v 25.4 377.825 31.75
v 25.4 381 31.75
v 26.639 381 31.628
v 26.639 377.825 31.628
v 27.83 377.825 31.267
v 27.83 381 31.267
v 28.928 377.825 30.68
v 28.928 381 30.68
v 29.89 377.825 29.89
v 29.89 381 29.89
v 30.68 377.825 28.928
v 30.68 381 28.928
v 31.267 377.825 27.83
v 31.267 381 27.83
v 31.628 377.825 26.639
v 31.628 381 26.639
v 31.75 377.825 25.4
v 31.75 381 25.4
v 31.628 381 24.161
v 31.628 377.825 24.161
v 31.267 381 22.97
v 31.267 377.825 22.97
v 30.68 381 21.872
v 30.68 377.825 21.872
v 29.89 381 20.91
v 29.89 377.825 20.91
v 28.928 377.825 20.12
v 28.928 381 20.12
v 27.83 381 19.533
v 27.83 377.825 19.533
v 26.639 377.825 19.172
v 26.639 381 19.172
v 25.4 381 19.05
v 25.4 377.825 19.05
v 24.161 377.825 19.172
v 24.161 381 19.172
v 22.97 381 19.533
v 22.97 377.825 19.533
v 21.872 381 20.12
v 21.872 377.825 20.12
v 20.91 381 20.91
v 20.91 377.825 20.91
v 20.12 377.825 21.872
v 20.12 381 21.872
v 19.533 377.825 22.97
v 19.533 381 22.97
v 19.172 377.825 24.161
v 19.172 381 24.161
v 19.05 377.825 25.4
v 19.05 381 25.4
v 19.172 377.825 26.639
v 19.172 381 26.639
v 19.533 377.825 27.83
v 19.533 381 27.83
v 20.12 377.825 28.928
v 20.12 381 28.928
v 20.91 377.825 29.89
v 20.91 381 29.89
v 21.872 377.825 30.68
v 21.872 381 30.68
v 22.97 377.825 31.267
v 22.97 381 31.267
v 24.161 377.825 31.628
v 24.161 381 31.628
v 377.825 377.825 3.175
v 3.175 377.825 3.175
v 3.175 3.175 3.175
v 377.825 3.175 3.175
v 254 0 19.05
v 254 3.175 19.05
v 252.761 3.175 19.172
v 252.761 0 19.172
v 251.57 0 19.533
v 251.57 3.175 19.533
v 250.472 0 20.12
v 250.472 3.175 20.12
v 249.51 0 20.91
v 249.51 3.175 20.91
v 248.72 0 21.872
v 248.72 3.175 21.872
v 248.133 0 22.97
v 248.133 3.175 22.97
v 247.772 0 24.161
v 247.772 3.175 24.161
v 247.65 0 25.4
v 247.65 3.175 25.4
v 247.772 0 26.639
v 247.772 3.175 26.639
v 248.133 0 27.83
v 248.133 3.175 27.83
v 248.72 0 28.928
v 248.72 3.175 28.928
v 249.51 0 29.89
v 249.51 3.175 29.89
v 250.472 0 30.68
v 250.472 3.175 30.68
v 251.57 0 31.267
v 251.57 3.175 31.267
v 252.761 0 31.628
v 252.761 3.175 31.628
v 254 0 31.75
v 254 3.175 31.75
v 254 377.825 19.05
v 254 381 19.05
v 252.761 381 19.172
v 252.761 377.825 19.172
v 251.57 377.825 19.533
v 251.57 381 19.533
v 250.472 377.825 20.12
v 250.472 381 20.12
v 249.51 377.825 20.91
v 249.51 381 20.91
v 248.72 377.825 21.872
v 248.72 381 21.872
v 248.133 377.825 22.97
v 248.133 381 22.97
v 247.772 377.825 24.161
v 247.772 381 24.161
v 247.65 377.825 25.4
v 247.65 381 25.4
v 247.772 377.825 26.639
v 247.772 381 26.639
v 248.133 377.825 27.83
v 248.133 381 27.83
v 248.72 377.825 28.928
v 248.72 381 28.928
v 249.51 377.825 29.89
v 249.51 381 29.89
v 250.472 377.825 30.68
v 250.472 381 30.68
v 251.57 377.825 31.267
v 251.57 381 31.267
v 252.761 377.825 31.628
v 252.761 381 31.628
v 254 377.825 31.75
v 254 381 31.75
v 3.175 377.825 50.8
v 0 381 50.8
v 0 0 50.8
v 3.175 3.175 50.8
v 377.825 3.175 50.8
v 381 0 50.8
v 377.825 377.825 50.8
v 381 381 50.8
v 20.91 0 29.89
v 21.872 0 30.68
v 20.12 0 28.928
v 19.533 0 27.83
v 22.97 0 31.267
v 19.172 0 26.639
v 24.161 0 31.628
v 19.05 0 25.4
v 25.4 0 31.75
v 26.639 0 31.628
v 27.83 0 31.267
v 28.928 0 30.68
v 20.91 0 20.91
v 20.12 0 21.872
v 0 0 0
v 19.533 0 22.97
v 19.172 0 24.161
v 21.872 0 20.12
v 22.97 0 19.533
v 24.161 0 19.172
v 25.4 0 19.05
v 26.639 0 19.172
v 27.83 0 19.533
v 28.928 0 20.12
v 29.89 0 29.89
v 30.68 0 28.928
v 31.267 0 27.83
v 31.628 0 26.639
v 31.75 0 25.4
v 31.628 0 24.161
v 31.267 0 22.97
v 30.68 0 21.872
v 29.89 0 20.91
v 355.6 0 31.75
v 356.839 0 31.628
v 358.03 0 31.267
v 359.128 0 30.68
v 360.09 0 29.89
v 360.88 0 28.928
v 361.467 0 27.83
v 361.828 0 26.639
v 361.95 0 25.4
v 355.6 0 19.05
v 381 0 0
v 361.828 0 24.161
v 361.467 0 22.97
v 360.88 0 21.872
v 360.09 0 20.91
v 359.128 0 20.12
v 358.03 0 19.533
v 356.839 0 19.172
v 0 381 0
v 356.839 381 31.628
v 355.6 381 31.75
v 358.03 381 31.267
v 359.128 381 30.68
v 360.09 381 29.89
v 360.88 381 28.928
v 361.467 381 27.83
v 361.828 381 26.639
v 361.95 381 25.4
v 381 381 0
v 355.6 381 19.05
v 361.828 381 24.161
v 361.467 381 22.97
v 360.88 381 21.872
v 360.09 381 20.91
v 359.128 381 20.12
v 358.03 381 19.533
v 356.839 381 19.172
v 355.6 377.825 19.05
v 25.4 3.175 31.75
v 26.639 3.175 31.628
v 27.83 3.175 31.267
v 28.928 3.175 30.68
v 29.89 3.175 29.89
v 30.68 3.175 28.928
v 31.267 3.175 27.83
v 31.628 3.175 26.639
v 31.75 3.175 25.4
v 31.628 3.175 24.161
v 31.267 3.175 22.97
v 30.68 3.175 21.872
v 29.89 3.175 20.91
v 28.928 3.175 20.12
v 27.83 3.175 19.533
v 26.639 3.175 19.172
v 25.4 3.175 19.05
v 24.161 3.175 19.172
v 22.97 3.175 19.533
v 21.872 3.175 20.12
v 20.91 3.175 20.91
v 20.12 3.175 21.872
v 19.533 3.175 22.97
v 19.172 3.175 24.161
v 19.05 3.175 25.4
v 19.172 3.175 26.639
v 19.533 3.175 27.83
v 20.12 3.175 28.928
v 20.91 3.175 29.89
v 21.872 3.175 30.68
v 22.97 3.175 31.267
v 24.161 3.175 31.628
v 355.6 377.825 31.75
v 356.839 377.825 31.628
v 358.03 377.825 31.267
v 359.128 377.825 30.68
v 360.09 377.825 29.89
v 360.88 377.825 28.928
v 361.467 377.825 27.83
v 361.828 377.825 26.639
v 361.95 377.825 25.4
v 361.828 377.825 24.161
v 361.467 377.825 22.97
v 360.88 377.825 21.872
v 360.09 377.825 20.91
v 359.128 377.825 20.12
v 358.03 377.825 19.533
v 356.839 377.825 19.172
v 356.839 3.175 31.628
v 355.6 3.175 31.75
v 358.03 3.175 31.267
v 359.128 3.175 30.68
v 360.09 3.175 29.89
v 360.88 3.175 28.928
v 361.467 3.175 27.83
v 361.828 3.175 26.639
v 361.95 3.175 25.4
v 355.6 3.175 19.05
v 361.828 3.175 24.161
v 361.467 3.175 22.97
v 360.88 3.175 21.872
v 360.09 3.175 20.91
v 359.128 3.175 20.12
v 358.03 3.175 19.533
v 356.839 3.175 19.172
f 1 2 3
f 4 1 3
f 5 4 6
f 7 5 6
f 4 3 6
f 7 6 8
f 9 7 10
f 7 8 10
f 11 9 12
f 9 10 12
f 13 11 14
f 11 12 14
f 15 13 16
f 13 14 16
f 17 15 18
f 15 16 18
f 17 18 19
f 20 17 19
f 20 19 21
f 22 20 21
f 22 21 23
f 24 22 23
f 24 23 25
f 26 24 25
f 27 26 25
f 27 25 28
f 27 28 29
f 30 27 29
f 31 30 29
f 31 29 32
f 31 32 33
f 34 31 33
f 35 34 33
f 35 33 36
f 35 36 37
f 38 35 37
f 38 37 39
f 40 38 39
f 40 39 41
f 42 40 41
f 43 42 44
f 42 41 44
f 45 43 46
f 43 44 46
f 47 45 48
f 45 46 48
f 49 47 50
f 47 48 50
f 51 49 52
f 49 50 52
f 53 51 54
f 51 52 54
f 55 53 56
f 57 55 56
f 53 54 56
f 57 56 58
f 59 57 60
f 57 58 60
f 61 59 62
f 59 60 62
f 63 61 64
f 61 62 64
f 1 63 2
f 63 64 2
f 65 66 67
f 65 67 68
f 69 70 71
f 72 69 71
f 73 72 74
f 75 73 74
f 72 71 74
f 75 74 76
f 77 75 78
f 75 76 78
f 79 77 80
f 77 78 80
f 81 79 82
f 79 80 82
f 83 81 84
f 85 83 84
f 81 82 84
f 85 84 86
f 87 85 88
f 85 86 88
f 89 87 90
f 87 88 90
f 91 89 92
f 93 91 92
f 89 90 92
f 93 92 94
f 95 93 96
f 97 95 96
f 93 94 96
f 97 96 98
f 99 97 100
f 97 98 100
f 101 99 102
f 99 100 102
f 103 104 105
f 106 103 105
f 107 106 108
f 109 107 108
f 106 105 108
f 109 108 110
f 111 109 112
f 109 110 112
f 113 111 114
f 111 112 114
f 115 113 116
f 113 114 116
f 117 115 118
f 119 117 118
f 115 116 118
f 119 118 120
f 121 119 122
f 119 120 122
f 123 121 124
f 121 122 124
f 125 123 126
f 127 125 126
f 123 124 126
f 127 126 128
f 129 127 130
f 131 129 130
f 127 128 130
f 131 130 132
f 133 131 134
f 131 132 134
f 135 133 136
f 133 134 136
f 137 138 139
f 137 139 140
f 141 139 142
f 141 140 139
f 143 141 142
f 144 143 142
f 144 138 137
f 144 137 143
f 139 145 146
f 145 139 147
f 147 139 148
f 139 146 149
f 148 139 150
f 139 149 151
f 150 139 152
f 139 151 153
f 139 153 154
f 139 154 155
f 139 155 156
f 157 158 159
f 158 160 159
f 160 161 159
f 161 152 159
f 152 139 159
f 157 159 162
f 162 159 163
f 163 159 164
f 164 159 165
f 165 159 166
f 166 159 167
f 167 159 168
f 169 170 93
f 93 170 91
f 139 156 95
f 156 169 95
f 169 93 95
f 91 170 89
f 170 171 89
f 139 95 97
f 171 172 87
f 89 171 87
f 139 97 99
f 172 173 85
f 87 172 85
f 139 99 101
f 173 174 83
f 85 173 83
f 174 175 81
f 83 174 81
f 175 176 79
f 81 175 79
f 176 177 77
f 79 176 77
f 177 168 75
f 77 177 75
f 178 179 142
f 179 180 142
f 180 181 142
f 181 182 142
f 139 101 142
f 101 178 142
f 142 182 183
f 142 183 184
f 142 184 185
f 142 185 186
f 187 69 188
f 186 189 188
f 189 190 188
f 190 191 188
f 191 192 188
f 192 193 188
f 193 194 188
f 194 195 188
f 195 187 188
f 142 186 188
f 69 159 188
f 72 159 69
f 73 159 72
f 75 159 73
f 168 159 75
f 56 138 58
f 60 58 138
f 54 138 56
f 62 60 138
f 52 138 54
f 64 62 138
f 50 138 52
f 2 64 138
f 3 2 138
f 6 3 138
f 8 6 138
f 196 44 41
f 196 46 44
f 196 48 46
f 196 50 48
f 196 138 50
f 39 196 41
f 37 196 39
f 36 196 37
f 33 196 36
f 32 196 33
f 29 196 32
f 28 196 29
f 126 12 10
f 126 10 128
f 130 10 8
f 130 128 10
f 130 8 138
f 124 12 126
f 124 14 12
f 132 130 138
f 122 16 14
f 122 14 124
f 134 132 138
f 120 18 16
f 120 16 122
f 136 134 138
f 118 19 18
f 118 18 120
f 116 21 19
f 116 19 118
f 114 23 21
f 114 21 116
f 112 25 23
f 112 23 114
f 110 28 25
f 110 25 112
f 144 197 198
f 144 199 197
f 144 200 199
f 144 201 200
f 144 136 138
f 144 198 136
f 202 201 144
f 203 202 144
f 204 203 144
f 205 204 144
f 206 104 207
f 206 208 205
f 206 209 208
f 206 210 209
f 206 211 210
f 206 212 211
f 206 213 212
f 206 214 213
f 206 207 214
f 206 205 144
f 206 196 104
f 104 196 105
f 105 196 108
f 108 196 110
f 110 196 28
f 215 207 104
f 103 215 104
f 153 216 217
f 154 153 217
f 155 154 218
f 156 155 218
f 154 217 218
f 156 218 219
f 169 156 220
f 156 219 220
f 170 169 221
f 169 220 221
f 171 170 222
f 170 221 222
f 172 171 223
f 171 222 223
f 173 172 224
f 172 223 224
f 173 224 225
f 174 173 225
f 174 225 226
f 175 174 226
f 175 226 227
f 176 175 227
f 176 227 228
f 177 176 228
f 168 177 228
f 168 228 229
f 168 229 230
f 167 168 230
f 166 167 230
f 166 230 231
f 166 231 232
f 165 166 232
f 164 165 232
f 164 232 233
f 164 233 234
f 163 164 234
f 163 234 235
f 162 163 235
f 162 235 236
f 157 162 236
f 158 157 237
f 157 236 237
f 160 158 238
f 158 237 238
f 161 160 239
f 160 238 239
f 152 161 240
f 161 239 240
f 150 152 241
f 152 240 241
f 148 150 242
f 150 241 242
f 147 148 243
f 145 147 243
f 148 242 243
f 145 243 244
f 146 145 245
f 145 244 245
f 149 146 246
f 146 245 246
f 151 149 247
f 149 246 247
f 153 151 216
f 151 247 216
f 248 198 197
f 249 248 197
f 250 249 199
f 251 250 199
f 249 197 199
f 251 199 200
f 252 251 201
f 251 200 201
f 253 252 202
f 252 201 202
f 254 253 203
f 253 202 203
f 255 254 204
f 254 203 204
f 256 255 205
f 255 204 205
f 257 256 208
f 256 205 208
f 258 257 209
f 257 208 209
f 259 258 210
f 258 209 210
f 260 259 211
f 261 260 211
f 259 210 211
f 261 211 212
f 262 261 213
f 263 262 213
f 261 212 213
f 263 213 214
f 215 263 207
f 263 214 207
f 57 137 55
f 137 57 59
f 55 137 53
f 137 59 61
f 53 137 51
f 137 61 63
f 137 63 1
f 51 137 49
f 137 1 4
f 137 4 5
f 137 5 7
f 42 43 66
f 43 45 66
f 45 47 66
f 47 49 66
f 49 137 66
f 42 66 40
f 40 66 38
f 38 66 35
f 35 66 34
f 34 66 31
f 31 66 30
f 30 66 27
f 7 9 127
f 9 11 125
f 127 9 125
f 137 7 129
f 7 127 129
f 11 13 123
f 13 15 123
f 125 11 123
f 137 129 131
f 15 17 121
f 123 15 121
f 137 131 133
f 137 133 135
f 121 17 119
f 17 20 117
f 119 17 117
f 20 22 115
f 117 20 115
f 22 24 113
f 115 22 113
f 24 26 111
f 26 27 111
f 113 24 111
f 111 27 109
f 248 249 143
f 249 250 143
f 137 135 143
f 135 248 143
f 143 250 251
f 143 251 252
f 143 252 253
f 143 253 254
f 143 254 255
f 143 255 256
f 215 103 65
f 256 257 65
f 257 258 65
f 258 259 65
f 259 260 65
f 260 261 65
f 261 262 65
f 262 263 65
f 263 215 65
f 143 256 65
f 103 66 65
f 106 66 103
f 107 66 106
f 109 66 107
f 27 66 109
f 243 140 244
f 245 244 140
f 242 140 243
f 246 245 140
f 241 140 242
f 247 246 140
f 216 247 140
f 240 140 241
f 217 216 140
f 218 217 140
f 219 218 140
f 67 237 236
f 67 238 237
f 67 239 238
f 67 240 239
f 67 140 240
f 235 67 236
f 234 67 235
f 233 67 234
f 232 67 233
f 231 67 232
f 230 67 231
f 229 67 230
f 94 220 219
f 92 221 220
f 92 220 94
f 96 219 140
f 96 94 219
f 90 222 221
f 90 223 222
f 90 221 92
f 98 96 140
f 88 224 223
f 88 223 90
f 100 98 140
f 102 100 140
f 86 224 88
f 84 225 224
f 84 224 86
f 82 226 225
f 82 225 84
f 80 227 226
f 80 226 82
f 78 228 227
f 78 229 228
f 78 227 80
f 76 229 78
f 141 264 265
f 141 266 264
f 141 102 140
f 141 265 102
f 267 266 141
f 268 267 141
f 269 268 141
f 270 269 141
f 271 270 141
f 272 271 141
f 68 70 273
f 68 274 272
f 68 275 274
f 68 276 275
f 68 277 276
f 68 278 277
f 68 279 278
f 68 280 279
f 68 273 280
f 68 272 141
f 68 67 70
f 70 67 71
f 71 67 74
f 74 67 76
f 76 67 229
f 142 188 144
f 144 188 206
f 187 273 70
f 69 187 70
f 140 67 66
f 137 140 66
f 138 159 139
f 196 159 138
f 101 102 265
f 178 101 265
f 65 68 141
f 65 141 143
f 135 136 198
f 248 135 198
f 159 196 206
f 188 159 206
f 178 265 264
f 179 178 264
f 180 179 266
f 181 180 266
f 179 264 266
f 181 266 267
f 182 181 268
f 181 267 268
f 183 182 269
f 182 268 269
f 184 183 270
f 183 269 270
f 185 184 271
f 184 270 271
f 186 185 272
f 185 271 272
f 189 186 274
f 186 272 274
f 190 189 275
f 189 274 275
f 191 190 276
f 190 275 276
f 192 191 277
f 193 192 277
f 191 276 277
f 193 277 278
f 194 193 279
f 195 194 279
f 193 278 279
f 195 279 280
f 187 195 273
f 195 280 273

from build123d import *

# Parameters (mm, degrees)
SKETCH1_W           = 381
SKETCH1_H           = 381
BOSS_EXTRUDE1_DEPTH = 50.8
SHELL1_T            = -3.175
SKETCH2_R           = 6.35
CUT_EXTRUDE1_DEPTH  = 417.576
SKETCH4_R           = 6.35
CUT_EXTRUDE2_DEPTH  = 417.576


with BuildPart() as part:
    # Sketch1 → Boss-Extrude1 (new body)
    with BuildSketch(Plane.XY):
        with Locations((190.5, 190.5)):
            Rectangle(SKETCH1_W, SKETCH1_H)
    extrude(amount=BOSS_EXTRUDE1_DEPTH)

    # Shell1
    shell1_openings = [part.faces().sort_by_distance(p)[0] for p in [
        (190.5, 190.5, 50.8),
    ]]
    offset(amount=SHELL1_T, openings=shell1_openings, kind=Kind.INTERSECTION)

    # Sketch2 → Cut-Extrude1 (cut)
    with BuildSketch(Plane(origin=(0, 381, 0), x_dir=(1, 0, 0), z_dir=(0, 1, 0))):
        with Locations(Location((25.4, -25.4, 0), (0, 0, 270))):
            Circle(SKETCH2_R)
    extrude(amount=-CUT_EXTRUDE1_DEPTH, mode=Mode.SUBTRACT)

    # Sketch4 → Cut-Extrude2 (cut)
    with BuildSketch(Plane(origin=(0, 381, 0), x_dir=(1, 0, 0), z_dir=(0, 1, 0))):
        with Locations((254, -25.4)):
            Circle(SKETCH4_R)
        with BuildLine():
            Line((254, -31.75), (355.6, -31.75))
            ThreePointArc((355.6, -31.75), (349.25, -25.4), (355.6, -19.05))
            Line((355.6, -19.05), (254, -19.05))
            ThreePointArc((254, -19.05), (258.490128061, -20.909871939), (260.35, -25.4))
            ThreePointArc((260.35, -25.4), (258.490128061, -29.890128061), (254, -31.75))
        make_face()
        with Locations((355.6, -25.4)):
            Circle(SKETCH4_R)
    extrude(amount=-CUT_EXTRUDE2_DEPTH, mode=Mode.SUBTRACT)


solid = part.part
